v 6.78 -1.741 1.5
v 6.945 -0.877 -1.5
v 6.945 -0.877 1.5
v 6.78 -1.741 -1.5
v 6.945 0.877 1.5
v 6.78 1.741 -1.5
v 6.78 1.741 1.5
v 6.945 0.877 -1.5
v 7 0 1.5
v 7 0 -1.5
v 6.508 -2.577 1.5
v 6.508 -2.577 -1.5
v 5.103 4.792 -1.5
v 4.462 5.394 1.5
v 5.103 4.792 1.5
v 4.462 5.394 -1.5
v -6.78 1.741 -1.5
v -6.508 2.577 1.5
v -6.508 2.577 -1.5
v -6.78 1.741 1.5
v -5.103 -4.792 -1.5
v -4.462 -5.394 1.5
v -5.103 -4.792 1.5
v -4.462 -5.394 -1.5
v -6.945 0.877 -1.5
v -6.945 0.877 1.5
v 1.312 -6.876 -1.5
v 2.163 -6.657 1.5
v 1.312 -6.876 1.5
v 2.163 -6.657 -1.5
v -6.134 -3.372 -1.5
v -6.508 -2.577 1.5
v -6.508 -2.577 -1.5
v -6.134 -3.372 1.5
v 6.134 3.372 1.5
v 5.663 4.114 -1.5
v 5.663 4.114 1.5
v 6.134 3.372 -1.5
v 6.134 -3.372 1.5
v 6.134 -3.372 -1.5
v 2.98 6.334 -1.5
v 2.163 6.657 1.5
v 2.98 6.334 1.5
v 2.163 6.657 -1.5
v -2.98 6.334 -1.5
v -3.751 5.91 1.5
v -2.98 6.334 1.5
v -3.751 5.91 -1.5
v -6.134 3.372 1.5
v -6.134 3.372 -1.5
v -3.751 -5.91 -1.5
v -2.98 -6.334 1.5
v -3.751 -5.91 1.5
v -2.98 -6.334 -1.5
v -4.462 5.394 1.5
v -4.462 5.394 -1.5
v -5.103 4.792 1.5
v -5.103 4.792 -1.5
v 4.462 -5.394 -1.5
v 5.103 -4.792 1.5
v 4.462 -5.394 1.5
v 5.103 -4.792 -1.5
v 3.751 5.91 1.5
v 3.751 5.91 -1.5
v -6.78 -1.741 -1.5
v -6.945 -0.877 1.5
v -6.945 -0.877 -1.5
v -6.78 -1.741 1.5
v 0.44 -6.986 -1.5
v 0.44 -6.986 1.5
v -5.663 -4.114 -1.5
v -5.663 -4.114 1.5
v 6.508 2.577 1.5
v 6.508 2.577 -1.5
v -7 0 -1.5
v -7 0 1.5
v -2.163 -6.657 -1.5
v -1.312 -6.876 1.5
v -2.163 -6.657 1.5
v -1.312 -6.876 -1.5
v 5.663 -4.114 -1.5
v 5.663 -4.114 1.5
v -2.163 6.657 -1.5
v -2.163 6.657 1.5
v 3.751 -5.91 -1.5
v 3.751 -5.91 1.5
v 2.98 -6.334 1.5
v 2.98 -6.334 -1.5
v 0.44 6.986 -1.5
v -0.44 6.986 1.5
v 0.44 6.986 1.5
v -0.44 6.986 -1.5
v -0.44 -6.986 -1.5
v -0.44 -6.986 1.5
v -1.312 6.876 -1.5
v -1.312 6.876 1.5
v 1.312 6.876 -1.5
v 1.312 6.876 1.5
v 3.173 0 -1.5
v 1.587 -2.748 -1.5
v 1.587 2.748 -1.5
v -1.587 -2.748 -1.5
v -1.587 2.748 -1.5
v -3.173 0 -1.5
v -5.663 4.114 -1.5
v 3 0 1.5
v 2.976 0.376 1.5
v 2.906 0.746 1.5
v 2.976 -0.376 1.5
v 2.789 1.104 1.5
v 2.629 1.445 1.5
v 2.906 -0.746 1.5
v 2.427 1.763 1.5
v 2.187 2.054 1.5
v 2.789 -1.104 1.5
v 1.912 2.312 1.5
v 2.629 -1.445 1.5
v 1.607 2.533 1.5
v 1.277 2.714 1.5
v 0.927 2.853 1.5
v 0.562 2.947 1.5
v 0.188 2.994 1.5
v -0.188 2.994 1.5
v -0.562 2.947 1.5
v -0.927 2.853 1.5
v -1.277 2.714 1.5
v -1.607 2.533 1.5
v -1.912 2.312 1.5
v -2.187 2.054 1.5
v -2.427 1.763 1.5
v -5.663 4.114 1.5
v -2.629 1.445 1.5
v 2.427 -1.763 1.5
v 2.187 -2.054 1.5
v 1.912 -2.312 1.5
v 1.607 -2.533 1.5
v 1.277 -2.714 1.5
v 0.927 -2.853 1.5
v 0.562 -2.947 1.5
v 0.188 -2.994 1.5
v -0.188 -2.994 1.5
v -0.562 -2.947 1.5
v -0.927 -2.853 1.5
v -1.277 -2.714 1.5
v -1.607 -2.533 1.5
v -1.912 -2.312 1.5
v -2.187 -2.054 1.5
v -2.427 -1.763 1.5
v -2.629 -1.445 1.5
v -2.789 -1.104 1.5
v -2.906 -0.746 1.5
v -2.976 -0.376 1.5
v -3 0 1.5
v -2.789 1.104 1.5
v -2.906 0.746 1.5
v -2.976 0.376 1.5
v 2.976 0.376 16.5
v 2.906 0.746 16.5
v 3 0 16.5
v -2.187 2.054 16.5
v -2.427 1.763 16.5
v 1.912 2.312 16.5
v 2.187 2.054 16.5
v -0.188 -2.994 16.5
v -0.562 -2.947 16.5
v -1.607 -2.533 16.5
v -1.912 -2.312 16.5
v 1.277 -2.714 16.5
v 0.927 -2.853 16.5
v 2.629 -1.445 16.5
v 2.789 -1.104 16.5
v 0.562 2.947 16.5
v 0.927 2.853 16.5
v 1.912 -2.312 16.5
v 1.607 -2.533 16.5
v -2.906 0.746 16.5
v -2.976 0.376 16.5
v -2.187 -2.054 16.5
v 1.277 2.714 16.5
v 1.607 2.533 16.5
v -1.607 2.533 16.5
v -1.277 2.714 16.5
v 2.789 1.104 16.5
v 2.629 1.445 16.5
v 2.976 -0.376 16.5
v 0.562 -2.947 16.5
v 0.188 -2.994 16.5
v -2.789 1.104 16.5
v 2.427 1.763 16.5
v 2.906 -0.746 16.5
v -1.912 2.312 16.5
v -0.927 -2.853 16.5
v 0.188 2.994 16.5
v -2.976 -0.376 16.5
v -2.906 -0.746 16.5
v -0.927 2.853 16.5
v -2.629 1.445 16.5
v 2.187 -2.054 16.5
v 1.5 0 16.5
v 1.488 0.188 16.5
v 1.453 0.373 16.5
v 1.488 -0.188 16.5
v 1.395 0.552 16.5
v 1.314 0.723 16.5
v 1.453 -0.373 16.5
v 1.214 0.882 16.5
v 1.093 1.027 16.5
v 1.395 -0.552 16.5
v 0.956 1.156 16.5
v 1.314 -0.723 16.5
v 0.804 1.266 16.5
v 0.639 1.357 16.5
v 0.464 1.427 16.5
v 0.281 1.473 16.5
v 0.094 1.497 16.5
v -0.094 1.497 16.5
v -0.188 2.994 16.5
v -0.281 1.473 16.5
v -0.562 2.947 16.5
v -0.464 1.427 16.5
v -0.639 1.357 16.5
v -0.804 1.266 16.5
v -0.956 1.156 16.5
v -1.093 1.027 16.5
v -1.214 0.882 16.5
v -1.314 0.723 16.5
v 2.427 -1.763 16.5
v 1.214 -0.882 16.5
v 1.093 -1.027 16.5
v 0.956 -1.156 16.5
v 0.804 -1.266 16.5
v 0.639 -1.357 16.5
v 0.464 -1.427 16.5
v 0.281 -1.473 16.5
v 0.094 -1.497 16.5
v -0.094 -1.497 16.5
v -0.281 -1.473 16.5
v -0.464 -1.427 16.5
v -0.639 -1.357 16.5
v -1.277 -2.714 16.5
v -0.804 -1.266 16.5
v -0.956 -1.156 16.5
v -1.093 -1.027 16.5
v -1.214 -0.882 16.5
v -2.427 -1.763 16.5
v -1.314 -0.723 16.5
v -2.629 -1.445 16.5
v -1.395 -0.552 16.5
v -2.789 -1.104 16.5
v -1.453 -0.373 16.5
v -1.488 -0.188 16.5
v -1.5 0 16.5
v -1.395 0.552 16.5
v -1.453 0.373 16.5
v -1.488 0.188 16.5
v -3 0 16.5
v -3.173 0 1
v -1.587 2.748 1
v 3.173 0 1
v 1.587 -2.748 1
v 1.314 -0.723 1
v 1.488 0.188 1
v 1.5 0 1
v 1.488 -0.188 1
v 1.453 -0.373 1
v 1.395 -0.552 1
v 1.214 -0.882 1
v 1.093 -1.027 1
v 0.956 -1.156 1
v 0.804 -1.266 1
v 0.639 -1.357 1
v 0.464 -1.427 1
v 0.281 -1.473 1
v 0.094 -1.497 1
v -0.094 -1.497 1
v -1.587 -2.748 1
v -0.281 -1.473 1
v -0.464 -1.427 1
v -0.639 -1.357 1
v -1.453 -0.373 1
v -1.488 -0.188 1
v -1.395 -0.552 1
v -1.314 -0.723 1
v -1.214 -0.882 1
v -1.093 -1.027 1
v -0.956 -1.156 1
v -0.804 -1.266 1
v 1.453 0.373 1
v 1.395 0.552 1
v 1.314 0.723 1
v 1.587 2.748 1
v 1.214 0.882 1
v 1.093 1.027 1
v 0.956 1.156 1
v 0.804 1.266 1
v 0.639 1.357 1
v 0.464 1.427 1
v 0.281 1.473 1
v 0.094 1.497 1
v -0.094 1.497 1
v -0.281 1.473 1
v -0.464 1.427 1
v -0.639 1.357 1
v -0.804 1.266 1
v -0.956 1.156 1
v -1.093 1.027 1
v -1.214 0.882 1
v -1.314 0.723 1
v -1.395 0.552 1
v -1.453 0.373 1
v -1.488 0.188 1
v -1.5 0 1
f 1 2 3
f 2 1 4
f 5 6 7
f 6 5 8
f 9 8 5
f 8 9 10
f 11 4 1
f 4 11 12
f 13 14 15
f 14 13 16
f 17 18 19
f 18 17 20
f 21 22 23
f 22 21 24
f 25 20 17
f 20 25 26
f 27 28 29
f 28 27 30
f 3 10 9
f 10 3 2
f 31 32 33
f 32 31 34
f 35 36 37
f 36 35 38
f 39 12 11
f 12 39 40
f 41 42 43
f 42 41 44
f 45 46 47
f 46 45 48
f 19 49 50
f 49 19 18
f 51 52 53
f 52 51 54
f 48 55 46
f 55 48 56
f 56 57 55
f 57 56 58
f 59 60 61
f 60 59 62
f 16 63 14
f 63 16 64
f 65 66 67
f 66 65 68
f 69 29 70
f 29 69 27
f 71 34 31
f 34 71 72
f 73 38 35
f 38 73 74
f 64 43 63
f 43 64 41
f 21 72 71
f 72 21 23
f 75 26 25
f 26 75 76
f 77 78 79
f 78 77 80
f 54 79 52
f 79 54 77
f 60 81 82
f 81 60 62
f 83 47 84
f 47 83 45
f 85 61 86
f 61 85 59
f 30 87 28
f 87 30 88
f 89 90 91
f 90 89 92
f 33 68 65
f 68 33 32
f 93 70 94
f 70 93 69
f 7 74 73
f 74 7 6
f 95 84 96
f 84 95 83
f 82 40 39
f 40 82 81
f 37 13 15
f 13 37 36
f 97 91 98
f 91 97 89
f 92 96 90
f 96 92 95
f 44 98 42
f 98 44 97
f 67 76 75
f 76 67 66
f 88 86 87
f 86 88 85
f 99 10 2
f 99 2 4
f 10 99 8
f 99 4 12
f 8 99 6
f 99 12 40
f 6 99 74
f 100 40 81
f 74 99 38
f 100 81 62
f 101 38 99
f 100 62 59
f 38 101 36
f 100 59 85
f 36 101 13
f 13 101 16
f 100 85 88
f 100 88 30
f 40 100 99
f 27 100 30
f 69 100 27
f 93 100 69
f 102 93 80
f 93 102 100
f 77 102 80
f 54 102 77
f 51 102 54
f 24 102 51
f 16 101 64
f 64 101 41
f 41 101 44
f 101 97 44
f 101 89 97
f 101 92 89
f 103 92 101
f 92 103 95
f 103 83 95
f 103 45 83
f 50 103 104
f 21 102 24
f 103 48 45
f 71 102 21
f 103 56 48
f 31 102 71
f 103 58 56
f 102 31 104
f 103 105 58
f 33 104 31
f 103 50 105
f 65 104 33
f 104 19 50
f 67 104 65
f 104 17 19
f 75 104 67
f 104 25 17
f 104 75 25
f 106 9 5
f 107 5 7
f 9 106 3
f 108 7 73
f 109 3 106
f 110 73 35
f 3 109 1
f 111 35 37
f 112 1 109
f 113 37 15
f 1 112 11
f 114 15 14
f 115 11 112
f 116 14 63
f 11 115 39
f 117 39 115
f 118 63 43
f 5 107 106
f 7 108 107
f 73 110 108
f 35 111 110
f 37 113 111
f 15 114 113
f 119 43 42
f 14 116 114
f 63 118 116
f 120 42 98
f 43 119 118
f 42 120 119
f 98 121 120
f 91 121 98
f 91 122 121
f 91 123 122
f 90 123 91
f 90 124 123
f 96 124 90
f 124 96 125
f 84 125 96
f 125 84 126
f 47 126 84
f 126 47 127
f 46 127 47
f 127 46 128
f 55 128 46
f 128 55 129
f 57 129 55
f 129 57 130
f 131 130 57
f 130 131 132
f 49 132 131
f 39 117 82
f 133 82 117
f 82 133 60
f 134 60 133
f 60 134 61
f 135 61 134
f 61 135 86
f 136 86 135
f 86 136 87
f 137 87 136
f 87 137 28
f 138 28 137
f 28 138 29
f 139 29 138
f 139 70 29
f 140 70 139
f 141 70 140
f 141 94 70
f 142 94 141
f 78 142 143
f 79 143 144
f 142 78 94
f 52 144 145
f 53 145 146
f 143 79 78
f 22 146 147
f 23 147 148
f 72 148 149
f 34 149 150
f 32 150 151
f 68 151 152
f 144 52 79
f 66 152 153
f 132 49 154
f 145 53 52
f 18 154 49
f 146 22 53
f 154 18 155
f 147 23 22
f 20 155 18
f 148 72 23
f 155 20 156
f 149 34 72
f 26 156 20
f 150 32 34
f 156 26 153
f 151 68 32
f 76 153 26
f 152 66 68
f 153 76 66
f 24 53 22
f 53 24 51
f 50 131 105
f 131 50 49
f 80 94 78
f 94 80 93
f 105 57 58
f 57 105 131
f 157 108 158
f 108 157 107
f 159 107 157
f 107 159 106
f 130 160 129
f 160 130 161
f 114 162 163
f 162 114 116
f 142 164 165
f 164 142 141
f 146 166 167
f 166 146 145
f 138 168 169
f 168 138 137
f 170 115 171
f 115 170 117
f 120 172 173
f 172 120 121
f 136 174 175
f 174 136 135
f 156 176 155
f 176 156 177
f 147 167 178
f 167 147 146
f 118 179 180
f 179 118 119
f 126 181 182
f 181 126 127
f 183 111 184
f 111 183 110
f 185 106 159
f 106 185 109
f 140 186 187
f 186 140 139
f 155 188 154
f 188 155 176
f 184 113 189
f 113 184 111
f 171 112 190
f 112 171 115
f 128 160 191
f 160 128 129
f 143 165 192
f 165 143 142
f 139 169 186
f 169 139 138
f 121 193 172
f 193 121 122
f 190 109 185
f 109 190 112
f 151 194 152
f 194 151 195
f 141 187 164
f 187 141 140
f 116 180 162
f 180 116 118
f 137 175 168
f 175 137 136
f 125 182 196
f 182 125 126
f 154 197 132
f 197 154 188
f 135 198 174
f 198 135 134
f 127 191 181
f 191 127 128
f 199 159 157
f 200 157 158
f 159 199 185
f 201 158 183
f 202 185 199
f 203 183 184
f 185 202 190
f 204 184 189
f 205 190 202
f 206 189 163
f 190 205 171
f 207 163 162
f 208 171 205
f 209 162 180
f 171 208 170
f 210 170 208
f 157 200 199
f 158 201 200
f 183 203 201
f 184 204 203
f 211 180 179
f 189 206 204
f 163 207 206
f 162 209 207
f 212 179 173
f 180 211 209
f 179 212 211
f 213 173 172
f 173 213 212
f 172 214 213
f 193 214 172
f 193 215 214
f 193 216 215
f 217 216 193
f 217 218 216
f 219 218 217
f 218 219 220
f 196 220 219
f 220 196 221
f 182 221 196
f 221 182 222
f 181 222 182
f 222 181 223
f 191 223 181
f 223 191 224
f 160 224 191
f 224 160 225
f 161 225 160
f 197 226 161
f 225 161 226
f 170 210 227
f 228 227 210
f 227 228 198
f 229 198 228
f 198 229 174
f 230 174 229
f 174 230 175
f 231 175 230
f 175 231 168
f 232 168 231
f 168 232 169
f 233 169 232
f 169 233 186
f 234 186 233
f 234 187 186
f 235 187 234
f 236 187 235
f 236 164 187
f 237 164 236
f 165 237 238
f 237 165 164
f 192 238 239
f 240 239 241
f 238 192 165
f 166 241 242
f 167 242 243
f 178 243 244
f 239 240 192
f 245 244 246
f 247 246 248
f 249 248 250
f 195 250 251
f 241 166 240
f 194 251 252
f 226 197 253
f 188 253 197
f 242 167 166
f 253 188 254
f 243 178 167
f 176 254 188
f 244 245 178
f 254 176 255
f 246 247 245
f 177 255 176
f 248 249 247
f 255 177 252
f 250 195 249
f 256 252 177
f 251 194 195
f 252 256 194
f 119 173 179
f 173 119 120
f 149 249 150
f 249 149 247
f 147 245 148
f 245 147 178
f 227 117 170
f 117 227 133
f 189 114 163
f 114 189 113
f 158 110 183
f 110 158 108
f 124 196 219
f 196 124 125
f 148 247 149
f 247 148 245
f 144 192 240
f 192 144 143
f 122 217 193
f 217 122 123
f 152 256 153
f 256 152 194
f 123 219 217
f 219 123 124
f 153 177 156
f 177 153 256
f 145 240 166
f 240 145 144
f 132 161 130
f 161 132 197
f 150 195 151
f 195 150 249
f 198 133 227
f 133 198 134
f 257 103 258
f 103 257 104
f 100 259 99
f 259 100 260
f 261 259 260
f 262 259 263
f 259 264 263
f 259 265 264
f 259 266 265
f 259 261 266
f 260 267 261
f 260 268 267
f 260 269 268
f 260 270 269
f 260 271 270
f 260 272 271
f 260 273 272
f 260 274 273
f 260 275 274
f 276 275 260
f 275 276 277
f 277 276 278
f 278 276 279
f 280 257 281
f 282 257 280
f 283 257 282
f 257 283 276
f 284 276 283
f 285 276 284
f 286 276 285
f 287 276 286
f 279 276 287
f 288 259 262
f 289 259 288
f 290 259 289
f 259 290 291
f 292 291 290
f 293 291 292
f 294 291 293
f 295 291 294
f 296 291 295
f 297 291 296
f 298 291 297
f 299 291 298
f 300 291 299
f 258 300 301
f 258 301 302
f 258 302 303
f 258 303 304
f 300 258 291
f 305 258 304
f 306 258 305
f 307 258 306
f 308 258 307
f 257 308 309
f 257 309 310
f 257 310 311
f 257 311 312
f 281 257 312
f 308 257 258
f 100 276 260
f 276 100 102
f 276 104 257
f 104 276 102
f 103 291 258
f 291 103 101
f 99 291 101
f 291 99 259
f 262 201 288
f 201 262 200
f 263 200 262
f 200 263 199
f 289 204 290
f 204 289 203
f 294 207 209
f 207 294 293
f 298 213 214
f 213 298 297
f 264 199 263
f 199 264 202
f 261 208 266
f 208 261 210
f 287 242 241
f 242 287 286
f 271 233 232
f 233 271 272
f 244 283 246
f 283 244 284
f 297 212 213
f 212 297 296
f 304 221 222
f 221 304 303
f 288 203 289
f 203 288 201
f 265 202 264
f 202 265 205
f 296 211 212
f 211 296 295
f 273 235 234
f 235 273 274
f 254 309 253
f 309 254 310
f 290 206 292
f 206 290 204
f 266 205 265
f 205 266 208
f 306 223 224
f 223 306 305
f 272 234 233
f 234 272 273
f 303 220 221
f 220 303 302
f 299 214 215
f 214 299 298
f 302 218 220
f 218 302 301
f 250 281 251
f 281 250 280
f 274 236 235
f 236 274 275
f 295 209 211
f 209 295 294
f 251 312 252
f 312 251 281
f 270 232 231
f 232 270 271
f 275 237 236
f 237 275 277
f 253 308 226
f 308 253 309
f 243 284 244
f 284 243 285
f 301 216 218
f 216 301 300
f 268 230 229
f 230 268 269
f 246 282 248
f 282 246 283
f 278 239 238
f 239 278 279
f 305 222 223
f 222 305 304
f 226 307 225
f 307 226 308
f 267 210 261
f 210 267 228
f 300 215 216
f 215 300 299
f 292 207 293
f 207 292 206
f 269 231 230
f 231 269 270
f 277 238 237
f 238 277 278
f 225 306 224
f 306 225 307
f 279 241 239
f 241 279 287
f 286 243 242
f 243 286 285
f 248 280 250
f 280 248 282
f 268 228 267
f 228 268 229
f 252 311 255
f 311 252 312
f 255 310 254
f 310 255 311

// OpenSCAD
$fn = 50;


difference() {
	union() {
		translate(v = [0, 0, -1.5000000000]) {
			cylinder(h = 3, r = 7.0000000000);
		}
		translate(v = [0, 0, -1.5000000000]) {
			cylinder(h = 18, r = 3.0000000000);
		}
	}
	union() {
		translate(v = [0, 0, -1.5000000000]) {
			rotate(a = [0, 0, 0]) {
				difference() {
					union() {
						linear_extrude(height = 2.5000000000) {
							polygon(points = [[3.1735000000, 0.0000000000], [1.5867500000, 2.7483316189], [-1.5867500000, 2.7483316189], [-3.1735000000, 0.0000000000], [-1.5867500000, -2.7483316189], [1.5867500000, -2.7483316189]]);
						}
					}
					union();
				}
			}
		}
		translate(v = [0, 0, -100.0000000000]) {
			cylinder(h = 200, r = 1.5000000000);
		}
	}
}
